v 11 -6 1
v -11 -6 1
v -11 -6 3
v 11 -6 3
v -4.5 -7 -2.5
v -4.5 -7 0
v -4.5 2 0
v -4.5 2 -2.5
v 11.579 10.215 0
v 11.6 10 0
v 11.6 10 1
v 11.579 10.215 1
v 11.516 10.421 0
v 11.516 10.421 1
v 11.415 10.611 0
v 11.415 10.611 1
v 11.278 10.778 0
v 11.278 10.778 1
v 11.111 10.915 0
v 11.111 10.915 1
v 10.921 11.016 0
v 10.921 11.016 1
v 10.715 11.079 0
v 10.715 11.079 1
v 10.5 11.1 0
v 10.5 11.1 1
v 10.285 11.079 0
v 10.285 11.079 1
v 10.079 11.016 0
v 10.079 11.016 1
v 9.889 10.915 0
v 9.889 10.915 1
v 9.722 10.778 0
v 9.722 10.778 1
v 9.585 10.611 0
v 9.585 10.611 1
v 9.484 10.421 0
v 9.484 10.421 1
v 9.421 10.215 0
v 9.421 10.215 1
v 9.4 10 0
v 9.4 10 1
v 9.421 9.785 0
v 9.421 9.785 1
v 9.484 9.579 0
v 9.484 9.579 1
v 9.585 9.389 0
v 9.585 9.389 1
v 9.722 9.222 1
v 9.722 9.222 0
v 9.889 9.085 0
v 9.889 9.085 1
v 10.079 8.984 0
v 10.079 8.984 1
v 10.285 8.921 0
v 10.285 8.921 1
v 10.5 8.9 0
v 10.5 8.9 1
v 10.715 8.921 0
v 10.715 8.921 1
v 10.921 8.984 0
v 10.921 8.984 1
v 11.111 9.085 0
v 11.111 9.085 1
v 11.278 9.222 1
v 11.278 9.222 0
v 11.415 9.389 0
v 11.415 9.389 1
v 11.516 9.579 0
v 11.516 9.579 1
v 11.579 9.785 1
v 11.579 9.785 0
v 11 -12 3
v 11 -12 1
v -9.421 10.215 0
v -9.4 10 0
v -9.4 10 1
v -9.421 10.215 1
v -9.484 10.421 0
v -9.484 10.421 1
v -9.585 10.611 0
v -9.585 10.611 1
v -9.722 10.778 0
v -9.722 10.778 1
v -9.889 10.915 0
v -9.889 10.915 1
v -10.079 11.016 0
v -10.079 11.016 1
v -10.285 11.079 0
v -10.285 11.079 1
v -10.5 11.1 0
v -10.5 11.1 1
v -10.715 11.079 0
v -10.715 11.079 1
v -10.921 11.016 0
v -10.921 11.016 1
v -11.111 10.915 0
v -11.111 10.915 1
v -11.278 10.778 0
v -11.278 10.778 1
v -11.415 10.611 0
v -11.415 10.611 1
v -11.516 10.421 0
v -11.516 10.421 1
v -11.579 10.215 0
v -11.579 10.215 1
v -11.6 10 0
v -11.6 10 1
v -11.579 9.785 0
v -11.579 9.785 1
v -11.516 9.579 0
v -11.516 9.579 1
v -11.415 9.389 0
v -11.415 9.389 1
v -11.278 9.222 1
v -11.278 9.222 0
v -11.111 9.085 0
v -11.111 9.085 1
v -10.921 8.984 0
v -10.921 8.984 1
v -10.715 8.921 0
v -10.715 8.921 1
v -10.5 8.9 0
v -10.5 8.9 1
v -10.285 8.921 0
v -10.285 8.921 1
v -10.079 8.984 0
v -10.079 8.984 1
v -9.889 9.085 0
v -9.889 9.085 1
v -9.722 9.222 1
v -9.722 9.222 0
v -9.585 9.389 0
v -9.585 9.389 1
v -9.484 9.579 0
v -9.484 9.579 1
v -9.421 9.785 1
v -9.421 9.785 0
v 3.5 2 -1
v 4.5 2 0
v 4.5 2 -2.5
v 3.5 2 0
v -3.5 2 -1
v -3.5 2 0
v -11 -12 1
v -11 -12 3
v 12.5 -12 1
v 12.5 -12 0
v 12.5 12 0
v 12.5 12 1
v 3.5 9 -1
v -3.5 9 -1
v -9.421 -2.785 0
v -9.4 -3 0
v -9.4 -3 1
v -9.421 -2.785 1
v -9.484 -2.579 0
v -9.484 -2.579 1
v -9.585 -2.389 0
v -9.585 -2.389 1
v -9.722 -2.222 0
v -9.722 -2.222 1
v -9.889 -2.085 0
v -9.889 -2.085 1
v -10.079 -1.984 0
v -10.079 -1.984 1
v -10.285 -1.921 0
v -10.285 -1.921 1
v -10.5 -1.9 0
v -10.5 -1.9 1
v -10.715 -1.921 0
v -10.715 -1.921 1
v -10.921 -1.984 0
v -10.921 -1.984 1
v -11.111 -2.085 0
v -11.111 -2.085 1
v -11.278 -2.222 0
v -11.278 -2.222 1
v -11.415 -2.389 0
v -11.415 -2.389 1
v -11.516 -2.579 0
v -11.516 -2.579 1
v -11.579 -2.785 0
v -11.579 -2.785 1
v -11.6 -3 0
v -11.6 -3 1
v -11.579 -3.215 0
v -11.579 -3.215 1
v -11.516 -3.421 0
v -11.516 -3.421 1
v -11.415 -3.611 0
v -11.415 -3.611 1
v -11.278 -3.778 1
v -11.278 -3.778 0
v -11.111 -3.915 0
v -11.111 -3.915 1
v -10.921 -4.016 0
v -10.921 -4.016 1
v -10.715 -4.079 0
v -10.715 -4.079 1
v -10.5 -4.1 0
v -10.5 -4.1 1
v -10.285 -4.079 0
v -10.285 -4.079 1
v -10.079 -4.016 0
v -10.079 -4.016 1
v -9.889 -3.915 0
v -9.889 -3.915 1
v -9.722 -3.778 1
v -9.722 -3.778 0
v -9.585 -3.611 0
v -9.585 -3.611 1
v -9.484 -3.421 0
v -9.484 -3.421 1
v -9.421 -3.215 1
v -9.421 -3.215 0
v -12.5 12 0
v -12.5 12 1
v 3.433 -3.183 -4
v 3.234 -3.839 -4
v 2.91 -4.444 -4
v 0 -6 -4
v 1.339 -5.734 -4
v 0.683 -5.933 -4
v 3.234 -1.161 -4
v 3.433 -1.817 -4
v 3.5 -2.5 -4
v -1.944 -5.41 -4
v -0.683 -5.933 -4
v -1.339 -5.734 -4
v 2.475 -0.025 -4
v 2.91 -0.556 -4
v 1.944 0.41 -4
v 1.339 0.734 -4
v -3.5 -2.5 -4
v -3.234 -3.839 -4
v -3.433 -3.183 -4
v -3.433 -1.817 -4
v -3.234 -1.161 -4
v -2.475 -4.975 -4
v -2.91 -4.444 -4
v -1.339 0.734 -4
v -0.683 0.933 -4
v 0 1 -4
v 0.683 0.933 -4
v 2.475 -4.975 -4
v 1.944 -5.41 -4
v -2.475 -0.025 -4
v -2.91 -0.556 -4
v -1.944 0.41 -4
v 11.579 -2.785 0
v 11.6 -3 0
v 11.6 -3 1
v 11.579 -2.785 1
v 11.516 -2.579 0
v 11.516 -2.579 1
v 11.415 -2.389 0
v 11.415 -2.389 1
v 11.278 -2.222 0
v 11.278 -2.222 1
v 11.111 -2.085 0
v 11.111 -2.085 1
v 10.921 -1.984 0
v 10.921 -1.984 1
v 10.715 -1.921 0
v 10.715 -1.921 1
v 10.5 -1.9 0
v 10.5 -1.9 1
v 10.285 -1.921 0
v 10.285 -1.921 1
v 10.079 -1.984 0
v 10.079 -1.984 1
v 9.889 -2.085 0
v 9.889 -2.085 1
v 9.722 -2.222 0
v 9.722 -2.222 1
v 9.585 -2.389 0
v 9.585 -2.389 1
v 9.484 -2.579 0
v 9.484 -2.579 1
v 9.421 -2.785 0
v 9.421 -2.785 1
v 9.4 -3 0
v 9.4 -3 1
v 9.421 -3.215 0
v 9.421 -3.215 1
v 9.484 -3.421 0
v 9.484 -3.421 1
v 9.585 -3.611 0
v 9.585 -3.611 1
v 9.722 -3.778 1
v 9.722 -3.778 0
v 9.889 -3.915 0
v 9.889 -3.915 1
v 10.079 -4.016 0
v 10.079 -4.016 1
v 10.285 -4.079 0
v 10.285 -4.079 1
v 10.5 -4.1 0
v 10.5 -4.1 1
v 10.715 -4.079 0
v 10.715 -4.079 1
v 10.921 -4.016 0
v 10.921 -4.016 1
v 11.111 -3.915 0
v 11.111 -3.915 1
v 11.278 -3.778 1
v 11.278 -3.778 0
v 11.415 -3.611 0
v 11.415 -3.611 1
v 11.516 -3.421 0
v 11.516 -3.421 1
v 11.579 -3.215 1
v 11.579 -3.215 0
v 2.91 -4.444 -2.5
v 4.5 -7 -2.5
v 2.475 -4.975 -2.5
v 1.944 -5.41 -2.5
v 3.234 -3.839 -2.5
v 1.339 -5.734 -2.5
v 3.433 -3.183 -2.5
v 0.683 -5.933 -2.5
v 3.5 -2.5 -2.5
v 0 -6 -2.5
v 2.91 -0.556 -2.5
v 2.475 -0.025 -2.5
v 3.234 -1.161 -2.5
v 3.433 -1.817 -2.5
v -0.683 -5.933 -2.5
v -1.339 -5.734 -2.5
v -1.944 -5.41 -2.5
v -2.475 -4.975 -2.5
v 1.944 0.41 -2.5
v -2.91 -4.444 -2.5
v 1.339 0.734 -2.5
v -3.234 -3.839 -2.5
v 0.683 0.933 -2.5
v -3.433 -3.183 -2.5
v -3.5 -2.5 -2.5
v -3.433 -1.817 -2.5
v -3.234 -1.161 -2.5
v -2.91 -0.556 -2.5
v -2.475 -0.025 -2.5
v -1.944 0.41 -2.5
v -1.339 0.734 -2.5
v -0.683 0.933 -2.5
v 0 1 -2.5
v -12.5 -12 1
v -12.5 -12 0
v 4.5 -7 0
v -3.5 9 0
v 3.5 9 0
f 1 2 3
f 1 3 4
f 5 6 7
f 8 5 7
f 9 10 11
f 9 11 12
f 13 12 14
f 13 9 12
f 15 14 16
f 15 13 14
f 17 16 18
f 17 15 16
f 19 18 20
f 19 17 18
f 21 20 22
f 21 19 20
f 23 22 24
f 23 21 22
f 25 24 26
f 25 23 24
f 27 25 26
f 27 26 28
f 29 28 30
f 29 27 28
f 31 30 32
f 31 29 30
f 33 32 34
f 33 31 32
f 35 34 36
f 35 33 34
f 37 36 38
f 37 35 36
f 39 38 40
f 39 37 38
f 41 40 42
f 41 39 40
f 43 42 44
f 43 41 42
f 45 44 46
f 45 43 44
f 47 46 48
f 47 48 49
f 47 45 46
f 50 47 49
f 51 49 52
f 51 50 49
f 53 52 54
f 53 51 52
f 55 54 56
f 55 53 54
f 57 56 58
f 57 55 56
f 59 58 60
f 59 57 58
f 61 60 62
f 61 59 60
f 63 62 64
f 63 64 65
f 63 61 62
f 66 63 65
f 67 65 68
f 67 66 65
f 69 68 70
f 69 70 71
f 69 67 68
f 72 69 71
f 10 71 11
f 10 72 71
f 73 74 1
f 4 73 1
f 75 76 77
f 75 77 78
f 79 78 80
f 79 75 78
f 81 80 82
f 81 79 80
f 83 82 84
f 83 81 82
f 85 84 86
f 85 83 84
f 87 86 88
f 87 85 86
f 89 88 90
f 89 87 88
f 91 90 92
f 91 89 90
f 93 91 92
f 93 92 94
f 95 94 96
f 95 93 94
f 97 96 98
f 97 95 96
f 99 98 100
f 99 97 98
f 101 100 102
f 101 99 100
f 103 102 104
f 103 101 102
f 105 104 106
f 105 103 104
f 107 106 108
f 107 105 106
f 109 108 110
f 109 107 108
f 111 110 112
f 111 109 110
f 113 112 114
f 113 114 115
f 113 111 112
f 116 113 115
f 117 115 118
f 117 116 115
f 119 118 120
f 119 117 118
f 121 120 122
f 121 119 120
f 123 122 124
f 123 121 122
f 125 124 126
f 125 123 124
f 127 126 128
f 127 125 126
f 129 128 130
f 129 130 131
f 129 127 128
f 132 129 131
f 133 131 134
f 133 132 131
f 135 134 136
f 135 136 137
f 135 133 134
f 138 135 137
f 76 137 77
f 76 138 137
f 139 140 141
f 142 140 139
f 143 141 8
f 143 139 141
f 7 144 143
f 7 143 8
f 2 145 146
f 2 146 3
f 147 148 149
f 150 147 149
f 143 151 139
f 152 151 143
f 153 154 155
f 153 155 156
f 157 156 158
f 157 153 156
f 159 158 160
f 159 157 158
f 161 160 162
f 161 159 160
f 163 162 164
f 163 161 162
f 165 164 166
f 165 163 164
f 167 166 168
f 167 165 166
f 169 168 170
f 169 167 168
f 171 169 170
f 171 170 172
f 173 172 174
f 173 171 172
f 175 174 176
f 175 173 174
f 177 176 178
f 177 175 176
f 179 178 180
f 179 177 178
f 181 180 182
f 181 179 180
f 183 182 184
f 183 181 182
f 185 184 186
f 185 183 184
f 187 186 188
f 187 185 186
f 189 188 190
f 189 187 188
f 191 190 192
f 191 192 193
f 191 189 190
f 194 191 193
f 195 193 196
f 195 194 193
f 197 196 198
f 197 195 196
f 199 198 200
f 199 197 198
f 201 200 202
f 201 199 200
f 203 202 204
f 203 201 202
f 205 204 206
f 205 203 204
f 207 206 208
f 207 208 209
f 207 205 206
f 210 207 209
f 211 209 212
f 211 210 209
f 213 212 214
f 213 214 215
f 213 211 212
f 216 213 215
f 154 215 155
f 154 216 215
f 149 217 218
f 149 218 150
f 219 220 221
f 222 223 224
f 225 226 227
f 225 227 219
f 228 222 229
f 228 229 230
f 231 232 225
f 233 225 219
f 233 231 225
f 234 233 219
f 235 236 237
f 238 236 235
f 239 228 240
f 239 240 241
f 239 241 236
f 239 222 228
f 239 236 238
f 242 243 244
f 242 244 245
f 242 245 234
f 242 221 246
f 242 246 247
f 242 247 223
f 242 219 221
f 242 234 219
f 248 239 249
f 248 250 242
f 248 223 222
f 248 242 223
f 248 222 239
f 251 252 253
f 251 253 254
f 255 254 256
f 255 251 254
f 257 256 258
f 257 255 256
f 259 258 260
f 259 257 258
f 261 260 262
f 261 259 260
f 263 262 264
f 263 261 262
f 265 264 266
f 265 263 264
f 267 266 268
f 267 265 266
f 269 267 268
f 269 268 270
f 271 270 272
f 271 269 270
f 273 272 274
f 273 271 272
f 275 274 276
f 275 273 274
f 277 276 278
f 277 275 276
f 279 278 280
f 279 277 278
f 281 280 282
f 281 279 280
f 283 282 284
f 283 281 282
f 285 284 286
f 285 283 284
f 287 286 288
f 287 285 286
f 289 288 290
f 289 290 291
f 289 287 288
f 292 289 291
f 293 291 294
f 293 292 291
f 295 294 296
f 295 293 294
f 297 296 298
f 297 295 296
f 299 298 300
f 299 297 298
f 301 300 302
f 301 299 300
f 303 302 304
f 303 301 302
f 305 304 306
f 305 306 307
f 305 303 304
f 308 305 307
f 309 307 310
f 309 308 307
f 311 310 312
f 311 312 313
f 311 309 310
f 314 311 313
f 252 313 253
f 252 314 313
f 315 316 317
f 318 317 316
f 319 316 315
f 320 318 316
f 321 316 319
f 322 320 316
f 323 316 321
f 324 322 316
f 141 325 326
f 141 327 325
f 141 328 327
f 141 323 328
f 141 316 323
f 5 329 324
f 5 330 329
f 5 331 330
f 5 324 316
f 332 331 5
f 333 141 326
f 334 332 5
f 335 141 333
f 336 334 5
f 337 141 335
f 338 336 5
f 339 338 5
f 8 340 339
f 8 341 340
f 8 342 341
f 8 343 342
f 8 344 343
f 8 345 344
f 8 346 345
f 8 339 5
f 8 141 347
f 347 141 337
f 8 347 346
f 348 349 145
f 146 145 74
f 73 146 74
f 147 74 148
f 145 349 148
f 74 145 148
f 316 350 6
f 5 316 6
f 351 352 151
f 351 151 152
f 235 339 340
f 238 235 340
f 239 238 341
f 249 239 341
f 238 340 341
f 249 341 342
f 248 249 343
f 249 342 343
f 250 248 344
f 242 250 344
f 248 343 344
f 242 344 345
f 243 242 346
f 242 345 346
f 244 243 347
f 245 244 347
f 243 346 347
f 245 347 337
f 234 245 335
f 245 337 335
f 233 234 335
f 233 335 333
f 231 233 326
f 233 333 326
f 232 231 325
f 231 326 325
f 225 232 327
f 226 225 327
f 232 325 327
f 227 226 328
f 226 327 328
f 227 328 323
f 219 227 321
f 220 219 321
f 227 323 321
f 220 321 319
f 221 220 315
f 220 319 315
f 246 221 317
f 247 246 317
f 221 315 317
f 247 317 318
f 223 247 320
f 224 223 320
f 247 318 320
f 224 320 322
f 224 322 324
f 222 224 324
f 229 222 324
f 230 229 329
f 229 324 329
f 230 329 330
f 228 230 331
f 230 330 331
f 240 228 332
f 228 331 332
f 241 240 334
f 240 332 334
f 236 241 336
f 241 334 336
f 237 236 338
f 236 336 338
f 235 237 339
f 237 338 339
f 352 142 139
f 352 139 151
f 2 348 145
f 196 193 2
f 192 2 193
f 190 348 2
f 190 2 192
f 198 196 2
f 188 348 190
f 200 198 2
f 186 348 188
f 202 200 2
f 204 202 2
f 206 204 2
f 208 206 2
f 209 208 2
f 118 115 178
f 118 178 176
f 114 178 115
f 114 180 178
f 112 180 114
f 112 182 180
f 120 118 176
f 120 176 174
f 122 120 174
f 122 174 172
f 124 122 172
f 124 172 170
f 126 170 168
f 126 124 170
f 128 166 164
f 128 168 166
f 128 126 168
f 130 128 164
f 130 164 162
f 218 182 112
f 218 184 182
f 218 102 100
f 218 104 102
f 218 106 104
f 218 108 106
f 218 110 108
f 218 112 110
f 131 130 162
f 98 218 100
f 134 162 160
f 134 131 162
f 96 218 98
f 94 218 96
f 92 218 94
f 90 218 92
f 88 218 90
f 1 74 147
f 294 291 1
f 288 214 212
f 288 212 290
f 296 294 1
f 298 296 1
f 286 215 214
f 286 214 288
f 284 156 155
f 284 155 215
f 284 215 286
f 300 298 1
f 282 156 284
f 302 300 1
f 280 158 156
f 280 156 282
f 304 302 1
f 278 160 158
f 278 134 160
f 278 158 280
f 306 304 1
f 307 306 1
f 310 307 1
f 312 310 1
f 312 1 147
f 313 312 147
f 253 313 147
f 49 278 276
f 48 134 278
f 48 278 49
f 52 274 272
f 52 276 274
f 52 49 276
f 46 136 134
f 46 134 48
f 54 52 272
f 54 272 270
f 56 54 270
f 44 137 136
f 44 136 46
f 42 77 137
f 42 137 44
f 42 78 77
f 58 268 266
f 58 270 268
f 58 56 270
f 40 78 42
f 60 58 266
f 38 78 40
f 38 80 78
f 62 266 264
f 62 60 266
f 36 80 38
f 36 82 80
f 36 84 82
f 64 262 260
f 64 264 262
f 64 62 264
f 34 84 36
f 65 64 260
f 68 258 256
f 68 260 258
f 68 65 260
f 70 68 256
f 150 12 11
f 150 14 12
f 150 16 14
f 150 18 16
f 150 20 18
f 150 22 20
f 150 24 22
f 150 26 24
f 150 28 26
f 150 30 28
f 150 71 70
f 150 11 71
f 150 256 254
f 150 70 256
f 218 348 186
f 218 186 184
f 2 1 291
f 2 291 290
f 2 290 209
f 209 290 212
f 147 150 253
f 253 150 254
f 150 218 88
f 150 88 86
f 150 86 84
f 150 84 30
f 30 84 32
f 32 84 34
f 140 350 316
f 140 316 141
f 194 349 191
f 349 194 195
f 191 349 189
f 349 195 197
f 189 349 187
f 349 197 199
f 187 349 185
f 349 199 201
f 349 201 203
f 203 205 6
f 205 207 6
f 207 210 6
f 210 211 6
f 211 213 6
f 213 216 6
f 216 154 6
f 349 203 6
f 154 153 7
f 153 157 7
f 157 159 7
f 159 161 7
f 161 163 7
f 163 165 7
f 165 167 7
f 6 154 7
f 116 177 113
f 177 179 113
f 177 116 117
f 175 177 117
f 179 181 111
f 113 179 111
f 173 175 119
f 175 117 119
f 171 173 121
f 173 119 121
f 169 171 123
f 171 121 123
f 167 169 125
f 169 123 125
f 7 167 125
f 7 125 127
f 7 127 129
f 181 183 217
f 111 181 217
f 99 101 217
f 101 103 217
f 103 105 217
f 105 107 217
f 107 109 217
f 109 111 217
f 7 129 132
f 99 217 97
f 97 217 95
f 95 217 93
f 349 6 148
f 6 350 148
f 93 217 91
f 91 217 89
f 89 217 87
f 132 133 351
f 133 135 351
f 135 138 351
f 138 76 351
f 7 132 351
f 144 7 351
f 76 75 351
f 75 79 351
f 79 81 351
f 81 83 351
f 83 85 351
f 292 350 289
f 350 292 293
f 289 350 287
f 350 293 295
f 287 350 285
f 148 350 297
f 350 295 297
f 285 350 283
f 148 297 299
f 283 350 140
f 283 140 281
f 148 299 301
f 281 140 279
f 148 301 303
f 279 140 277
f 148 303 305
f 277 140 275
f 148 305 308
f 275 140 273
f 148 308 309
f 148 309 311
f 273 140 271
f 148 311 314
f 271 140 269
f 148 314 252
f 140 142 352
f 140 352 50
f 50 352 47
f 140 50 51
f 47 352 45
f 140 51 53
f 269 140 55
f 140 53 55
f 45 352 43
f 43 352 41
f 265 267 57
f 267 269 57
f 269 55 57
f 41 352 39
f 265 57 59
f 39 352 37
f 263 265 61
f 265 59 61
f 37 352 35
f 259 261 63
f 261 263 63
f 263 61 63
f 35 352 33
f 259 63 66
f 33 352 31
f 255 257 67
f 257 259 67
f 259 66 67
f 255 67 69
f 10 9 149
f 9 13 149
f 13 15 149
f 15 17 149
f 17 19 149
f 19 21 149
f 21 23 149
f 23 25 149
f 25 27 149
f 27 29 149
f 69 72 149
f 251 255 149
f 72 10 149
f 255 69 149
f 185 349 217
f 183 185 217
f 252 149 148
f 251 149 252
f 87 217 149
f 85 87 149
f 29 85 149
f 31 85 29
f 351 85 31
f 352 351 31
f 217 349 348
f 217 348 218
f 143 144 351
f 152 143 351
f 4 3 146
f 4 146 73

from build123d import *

# Parameters (mm, degrees)
SKETCH_1_W      = 25
SKETCH_1_H      = 24
SKETCH_1_R      = 1.1
EXTRUDE_1_DEPTH = 1
SKETCH_2_W      = 22
SKETCH_2_H      = 6
EXTRUDE_2_DEPTH = 2
SKETCH_3_W      = 9
SKETCH_3_H      = 9
EXTRUDE_3_DEPTH = 2.5
SKETCH_4_R      = 3.5
EXTRUDE_4_DEPTH = 1.5
SKETCH_5_W      = 7
SKETCH_5_H      = 7
EXTRUDE_5_DEPTH = 1


with BuildPart() as part:
    # 草图1 → 凸台-拉伸1 (new body)
    with BuildSketch(Plane.XY):
        Rectangle(SKETCH_1_W, SKETCH_1_H)
        with Locations((-10.5, 10)):
            Circle(SKETCH_1_R, mode=Mode.SUBTRACT)
        with Locations((-10.5, -3)):
            Circle(SKETCH_1_R, mode=Mode.SUBTRACT)
        with Locations((10.5, -3)):
            Circle(SKETCH_1_R, mode=Mode.SUBTRACT)
        with Locations((10.5, 10)):
            Circle(SKETCH_1_R, mode=Mode.SUBTRACT)
    extrude(amount=EXTRUDE_1_DEPTH)

    # 草图2 → 凸台-拉伸2 (add)
    with BuildSketch(Plane.XY.offset(1)):
        with Locations((0, -9)):
            Rectangle(SKETCH_2_W, SKETCH_2_H)
    extrude(amount=EXTRUDE_2_DEPTH)

    # 草图3 → 凸台-拉伸3 (add)
    with BuildSketch(Plane(origin=(0, 0, 0), x_dir=(-1, 0, 0), z_dir=(0, 0, -1))):
        with Locations((0, -2.5)):
            Rectangle(SKETCH_3_W, SKETCH_3_H)
    extrude(amount=EXTRUDE_3_DEPTH)

    # 草图4 → 凸台-拉伸4 (add)
    with BuildSketch(Plane(origin=(0, 0, -2.5), x_dir=(-1, 0, 0), z_dir=(0, 0, -1))):
        with Locations((0, -2.5)):
            Circle(SKETCH_4_R)
    extrude(amount=EXTRUDE_4_DEPTH)

    # 草图5 → 凸台-拉伸5 (add)
    with BuildSketch(Plane(origin=(0, 0, 0), x_dir=(-1, 0, 0), z_dir=(0, 0, -1))):
        with Locations((0, 5.5)):
            Rectangle(SKETCH_5_W, SKETCH_5_H)
    extrude(amount=EXTRUDE_5_DEPTH)


solid = part.part
